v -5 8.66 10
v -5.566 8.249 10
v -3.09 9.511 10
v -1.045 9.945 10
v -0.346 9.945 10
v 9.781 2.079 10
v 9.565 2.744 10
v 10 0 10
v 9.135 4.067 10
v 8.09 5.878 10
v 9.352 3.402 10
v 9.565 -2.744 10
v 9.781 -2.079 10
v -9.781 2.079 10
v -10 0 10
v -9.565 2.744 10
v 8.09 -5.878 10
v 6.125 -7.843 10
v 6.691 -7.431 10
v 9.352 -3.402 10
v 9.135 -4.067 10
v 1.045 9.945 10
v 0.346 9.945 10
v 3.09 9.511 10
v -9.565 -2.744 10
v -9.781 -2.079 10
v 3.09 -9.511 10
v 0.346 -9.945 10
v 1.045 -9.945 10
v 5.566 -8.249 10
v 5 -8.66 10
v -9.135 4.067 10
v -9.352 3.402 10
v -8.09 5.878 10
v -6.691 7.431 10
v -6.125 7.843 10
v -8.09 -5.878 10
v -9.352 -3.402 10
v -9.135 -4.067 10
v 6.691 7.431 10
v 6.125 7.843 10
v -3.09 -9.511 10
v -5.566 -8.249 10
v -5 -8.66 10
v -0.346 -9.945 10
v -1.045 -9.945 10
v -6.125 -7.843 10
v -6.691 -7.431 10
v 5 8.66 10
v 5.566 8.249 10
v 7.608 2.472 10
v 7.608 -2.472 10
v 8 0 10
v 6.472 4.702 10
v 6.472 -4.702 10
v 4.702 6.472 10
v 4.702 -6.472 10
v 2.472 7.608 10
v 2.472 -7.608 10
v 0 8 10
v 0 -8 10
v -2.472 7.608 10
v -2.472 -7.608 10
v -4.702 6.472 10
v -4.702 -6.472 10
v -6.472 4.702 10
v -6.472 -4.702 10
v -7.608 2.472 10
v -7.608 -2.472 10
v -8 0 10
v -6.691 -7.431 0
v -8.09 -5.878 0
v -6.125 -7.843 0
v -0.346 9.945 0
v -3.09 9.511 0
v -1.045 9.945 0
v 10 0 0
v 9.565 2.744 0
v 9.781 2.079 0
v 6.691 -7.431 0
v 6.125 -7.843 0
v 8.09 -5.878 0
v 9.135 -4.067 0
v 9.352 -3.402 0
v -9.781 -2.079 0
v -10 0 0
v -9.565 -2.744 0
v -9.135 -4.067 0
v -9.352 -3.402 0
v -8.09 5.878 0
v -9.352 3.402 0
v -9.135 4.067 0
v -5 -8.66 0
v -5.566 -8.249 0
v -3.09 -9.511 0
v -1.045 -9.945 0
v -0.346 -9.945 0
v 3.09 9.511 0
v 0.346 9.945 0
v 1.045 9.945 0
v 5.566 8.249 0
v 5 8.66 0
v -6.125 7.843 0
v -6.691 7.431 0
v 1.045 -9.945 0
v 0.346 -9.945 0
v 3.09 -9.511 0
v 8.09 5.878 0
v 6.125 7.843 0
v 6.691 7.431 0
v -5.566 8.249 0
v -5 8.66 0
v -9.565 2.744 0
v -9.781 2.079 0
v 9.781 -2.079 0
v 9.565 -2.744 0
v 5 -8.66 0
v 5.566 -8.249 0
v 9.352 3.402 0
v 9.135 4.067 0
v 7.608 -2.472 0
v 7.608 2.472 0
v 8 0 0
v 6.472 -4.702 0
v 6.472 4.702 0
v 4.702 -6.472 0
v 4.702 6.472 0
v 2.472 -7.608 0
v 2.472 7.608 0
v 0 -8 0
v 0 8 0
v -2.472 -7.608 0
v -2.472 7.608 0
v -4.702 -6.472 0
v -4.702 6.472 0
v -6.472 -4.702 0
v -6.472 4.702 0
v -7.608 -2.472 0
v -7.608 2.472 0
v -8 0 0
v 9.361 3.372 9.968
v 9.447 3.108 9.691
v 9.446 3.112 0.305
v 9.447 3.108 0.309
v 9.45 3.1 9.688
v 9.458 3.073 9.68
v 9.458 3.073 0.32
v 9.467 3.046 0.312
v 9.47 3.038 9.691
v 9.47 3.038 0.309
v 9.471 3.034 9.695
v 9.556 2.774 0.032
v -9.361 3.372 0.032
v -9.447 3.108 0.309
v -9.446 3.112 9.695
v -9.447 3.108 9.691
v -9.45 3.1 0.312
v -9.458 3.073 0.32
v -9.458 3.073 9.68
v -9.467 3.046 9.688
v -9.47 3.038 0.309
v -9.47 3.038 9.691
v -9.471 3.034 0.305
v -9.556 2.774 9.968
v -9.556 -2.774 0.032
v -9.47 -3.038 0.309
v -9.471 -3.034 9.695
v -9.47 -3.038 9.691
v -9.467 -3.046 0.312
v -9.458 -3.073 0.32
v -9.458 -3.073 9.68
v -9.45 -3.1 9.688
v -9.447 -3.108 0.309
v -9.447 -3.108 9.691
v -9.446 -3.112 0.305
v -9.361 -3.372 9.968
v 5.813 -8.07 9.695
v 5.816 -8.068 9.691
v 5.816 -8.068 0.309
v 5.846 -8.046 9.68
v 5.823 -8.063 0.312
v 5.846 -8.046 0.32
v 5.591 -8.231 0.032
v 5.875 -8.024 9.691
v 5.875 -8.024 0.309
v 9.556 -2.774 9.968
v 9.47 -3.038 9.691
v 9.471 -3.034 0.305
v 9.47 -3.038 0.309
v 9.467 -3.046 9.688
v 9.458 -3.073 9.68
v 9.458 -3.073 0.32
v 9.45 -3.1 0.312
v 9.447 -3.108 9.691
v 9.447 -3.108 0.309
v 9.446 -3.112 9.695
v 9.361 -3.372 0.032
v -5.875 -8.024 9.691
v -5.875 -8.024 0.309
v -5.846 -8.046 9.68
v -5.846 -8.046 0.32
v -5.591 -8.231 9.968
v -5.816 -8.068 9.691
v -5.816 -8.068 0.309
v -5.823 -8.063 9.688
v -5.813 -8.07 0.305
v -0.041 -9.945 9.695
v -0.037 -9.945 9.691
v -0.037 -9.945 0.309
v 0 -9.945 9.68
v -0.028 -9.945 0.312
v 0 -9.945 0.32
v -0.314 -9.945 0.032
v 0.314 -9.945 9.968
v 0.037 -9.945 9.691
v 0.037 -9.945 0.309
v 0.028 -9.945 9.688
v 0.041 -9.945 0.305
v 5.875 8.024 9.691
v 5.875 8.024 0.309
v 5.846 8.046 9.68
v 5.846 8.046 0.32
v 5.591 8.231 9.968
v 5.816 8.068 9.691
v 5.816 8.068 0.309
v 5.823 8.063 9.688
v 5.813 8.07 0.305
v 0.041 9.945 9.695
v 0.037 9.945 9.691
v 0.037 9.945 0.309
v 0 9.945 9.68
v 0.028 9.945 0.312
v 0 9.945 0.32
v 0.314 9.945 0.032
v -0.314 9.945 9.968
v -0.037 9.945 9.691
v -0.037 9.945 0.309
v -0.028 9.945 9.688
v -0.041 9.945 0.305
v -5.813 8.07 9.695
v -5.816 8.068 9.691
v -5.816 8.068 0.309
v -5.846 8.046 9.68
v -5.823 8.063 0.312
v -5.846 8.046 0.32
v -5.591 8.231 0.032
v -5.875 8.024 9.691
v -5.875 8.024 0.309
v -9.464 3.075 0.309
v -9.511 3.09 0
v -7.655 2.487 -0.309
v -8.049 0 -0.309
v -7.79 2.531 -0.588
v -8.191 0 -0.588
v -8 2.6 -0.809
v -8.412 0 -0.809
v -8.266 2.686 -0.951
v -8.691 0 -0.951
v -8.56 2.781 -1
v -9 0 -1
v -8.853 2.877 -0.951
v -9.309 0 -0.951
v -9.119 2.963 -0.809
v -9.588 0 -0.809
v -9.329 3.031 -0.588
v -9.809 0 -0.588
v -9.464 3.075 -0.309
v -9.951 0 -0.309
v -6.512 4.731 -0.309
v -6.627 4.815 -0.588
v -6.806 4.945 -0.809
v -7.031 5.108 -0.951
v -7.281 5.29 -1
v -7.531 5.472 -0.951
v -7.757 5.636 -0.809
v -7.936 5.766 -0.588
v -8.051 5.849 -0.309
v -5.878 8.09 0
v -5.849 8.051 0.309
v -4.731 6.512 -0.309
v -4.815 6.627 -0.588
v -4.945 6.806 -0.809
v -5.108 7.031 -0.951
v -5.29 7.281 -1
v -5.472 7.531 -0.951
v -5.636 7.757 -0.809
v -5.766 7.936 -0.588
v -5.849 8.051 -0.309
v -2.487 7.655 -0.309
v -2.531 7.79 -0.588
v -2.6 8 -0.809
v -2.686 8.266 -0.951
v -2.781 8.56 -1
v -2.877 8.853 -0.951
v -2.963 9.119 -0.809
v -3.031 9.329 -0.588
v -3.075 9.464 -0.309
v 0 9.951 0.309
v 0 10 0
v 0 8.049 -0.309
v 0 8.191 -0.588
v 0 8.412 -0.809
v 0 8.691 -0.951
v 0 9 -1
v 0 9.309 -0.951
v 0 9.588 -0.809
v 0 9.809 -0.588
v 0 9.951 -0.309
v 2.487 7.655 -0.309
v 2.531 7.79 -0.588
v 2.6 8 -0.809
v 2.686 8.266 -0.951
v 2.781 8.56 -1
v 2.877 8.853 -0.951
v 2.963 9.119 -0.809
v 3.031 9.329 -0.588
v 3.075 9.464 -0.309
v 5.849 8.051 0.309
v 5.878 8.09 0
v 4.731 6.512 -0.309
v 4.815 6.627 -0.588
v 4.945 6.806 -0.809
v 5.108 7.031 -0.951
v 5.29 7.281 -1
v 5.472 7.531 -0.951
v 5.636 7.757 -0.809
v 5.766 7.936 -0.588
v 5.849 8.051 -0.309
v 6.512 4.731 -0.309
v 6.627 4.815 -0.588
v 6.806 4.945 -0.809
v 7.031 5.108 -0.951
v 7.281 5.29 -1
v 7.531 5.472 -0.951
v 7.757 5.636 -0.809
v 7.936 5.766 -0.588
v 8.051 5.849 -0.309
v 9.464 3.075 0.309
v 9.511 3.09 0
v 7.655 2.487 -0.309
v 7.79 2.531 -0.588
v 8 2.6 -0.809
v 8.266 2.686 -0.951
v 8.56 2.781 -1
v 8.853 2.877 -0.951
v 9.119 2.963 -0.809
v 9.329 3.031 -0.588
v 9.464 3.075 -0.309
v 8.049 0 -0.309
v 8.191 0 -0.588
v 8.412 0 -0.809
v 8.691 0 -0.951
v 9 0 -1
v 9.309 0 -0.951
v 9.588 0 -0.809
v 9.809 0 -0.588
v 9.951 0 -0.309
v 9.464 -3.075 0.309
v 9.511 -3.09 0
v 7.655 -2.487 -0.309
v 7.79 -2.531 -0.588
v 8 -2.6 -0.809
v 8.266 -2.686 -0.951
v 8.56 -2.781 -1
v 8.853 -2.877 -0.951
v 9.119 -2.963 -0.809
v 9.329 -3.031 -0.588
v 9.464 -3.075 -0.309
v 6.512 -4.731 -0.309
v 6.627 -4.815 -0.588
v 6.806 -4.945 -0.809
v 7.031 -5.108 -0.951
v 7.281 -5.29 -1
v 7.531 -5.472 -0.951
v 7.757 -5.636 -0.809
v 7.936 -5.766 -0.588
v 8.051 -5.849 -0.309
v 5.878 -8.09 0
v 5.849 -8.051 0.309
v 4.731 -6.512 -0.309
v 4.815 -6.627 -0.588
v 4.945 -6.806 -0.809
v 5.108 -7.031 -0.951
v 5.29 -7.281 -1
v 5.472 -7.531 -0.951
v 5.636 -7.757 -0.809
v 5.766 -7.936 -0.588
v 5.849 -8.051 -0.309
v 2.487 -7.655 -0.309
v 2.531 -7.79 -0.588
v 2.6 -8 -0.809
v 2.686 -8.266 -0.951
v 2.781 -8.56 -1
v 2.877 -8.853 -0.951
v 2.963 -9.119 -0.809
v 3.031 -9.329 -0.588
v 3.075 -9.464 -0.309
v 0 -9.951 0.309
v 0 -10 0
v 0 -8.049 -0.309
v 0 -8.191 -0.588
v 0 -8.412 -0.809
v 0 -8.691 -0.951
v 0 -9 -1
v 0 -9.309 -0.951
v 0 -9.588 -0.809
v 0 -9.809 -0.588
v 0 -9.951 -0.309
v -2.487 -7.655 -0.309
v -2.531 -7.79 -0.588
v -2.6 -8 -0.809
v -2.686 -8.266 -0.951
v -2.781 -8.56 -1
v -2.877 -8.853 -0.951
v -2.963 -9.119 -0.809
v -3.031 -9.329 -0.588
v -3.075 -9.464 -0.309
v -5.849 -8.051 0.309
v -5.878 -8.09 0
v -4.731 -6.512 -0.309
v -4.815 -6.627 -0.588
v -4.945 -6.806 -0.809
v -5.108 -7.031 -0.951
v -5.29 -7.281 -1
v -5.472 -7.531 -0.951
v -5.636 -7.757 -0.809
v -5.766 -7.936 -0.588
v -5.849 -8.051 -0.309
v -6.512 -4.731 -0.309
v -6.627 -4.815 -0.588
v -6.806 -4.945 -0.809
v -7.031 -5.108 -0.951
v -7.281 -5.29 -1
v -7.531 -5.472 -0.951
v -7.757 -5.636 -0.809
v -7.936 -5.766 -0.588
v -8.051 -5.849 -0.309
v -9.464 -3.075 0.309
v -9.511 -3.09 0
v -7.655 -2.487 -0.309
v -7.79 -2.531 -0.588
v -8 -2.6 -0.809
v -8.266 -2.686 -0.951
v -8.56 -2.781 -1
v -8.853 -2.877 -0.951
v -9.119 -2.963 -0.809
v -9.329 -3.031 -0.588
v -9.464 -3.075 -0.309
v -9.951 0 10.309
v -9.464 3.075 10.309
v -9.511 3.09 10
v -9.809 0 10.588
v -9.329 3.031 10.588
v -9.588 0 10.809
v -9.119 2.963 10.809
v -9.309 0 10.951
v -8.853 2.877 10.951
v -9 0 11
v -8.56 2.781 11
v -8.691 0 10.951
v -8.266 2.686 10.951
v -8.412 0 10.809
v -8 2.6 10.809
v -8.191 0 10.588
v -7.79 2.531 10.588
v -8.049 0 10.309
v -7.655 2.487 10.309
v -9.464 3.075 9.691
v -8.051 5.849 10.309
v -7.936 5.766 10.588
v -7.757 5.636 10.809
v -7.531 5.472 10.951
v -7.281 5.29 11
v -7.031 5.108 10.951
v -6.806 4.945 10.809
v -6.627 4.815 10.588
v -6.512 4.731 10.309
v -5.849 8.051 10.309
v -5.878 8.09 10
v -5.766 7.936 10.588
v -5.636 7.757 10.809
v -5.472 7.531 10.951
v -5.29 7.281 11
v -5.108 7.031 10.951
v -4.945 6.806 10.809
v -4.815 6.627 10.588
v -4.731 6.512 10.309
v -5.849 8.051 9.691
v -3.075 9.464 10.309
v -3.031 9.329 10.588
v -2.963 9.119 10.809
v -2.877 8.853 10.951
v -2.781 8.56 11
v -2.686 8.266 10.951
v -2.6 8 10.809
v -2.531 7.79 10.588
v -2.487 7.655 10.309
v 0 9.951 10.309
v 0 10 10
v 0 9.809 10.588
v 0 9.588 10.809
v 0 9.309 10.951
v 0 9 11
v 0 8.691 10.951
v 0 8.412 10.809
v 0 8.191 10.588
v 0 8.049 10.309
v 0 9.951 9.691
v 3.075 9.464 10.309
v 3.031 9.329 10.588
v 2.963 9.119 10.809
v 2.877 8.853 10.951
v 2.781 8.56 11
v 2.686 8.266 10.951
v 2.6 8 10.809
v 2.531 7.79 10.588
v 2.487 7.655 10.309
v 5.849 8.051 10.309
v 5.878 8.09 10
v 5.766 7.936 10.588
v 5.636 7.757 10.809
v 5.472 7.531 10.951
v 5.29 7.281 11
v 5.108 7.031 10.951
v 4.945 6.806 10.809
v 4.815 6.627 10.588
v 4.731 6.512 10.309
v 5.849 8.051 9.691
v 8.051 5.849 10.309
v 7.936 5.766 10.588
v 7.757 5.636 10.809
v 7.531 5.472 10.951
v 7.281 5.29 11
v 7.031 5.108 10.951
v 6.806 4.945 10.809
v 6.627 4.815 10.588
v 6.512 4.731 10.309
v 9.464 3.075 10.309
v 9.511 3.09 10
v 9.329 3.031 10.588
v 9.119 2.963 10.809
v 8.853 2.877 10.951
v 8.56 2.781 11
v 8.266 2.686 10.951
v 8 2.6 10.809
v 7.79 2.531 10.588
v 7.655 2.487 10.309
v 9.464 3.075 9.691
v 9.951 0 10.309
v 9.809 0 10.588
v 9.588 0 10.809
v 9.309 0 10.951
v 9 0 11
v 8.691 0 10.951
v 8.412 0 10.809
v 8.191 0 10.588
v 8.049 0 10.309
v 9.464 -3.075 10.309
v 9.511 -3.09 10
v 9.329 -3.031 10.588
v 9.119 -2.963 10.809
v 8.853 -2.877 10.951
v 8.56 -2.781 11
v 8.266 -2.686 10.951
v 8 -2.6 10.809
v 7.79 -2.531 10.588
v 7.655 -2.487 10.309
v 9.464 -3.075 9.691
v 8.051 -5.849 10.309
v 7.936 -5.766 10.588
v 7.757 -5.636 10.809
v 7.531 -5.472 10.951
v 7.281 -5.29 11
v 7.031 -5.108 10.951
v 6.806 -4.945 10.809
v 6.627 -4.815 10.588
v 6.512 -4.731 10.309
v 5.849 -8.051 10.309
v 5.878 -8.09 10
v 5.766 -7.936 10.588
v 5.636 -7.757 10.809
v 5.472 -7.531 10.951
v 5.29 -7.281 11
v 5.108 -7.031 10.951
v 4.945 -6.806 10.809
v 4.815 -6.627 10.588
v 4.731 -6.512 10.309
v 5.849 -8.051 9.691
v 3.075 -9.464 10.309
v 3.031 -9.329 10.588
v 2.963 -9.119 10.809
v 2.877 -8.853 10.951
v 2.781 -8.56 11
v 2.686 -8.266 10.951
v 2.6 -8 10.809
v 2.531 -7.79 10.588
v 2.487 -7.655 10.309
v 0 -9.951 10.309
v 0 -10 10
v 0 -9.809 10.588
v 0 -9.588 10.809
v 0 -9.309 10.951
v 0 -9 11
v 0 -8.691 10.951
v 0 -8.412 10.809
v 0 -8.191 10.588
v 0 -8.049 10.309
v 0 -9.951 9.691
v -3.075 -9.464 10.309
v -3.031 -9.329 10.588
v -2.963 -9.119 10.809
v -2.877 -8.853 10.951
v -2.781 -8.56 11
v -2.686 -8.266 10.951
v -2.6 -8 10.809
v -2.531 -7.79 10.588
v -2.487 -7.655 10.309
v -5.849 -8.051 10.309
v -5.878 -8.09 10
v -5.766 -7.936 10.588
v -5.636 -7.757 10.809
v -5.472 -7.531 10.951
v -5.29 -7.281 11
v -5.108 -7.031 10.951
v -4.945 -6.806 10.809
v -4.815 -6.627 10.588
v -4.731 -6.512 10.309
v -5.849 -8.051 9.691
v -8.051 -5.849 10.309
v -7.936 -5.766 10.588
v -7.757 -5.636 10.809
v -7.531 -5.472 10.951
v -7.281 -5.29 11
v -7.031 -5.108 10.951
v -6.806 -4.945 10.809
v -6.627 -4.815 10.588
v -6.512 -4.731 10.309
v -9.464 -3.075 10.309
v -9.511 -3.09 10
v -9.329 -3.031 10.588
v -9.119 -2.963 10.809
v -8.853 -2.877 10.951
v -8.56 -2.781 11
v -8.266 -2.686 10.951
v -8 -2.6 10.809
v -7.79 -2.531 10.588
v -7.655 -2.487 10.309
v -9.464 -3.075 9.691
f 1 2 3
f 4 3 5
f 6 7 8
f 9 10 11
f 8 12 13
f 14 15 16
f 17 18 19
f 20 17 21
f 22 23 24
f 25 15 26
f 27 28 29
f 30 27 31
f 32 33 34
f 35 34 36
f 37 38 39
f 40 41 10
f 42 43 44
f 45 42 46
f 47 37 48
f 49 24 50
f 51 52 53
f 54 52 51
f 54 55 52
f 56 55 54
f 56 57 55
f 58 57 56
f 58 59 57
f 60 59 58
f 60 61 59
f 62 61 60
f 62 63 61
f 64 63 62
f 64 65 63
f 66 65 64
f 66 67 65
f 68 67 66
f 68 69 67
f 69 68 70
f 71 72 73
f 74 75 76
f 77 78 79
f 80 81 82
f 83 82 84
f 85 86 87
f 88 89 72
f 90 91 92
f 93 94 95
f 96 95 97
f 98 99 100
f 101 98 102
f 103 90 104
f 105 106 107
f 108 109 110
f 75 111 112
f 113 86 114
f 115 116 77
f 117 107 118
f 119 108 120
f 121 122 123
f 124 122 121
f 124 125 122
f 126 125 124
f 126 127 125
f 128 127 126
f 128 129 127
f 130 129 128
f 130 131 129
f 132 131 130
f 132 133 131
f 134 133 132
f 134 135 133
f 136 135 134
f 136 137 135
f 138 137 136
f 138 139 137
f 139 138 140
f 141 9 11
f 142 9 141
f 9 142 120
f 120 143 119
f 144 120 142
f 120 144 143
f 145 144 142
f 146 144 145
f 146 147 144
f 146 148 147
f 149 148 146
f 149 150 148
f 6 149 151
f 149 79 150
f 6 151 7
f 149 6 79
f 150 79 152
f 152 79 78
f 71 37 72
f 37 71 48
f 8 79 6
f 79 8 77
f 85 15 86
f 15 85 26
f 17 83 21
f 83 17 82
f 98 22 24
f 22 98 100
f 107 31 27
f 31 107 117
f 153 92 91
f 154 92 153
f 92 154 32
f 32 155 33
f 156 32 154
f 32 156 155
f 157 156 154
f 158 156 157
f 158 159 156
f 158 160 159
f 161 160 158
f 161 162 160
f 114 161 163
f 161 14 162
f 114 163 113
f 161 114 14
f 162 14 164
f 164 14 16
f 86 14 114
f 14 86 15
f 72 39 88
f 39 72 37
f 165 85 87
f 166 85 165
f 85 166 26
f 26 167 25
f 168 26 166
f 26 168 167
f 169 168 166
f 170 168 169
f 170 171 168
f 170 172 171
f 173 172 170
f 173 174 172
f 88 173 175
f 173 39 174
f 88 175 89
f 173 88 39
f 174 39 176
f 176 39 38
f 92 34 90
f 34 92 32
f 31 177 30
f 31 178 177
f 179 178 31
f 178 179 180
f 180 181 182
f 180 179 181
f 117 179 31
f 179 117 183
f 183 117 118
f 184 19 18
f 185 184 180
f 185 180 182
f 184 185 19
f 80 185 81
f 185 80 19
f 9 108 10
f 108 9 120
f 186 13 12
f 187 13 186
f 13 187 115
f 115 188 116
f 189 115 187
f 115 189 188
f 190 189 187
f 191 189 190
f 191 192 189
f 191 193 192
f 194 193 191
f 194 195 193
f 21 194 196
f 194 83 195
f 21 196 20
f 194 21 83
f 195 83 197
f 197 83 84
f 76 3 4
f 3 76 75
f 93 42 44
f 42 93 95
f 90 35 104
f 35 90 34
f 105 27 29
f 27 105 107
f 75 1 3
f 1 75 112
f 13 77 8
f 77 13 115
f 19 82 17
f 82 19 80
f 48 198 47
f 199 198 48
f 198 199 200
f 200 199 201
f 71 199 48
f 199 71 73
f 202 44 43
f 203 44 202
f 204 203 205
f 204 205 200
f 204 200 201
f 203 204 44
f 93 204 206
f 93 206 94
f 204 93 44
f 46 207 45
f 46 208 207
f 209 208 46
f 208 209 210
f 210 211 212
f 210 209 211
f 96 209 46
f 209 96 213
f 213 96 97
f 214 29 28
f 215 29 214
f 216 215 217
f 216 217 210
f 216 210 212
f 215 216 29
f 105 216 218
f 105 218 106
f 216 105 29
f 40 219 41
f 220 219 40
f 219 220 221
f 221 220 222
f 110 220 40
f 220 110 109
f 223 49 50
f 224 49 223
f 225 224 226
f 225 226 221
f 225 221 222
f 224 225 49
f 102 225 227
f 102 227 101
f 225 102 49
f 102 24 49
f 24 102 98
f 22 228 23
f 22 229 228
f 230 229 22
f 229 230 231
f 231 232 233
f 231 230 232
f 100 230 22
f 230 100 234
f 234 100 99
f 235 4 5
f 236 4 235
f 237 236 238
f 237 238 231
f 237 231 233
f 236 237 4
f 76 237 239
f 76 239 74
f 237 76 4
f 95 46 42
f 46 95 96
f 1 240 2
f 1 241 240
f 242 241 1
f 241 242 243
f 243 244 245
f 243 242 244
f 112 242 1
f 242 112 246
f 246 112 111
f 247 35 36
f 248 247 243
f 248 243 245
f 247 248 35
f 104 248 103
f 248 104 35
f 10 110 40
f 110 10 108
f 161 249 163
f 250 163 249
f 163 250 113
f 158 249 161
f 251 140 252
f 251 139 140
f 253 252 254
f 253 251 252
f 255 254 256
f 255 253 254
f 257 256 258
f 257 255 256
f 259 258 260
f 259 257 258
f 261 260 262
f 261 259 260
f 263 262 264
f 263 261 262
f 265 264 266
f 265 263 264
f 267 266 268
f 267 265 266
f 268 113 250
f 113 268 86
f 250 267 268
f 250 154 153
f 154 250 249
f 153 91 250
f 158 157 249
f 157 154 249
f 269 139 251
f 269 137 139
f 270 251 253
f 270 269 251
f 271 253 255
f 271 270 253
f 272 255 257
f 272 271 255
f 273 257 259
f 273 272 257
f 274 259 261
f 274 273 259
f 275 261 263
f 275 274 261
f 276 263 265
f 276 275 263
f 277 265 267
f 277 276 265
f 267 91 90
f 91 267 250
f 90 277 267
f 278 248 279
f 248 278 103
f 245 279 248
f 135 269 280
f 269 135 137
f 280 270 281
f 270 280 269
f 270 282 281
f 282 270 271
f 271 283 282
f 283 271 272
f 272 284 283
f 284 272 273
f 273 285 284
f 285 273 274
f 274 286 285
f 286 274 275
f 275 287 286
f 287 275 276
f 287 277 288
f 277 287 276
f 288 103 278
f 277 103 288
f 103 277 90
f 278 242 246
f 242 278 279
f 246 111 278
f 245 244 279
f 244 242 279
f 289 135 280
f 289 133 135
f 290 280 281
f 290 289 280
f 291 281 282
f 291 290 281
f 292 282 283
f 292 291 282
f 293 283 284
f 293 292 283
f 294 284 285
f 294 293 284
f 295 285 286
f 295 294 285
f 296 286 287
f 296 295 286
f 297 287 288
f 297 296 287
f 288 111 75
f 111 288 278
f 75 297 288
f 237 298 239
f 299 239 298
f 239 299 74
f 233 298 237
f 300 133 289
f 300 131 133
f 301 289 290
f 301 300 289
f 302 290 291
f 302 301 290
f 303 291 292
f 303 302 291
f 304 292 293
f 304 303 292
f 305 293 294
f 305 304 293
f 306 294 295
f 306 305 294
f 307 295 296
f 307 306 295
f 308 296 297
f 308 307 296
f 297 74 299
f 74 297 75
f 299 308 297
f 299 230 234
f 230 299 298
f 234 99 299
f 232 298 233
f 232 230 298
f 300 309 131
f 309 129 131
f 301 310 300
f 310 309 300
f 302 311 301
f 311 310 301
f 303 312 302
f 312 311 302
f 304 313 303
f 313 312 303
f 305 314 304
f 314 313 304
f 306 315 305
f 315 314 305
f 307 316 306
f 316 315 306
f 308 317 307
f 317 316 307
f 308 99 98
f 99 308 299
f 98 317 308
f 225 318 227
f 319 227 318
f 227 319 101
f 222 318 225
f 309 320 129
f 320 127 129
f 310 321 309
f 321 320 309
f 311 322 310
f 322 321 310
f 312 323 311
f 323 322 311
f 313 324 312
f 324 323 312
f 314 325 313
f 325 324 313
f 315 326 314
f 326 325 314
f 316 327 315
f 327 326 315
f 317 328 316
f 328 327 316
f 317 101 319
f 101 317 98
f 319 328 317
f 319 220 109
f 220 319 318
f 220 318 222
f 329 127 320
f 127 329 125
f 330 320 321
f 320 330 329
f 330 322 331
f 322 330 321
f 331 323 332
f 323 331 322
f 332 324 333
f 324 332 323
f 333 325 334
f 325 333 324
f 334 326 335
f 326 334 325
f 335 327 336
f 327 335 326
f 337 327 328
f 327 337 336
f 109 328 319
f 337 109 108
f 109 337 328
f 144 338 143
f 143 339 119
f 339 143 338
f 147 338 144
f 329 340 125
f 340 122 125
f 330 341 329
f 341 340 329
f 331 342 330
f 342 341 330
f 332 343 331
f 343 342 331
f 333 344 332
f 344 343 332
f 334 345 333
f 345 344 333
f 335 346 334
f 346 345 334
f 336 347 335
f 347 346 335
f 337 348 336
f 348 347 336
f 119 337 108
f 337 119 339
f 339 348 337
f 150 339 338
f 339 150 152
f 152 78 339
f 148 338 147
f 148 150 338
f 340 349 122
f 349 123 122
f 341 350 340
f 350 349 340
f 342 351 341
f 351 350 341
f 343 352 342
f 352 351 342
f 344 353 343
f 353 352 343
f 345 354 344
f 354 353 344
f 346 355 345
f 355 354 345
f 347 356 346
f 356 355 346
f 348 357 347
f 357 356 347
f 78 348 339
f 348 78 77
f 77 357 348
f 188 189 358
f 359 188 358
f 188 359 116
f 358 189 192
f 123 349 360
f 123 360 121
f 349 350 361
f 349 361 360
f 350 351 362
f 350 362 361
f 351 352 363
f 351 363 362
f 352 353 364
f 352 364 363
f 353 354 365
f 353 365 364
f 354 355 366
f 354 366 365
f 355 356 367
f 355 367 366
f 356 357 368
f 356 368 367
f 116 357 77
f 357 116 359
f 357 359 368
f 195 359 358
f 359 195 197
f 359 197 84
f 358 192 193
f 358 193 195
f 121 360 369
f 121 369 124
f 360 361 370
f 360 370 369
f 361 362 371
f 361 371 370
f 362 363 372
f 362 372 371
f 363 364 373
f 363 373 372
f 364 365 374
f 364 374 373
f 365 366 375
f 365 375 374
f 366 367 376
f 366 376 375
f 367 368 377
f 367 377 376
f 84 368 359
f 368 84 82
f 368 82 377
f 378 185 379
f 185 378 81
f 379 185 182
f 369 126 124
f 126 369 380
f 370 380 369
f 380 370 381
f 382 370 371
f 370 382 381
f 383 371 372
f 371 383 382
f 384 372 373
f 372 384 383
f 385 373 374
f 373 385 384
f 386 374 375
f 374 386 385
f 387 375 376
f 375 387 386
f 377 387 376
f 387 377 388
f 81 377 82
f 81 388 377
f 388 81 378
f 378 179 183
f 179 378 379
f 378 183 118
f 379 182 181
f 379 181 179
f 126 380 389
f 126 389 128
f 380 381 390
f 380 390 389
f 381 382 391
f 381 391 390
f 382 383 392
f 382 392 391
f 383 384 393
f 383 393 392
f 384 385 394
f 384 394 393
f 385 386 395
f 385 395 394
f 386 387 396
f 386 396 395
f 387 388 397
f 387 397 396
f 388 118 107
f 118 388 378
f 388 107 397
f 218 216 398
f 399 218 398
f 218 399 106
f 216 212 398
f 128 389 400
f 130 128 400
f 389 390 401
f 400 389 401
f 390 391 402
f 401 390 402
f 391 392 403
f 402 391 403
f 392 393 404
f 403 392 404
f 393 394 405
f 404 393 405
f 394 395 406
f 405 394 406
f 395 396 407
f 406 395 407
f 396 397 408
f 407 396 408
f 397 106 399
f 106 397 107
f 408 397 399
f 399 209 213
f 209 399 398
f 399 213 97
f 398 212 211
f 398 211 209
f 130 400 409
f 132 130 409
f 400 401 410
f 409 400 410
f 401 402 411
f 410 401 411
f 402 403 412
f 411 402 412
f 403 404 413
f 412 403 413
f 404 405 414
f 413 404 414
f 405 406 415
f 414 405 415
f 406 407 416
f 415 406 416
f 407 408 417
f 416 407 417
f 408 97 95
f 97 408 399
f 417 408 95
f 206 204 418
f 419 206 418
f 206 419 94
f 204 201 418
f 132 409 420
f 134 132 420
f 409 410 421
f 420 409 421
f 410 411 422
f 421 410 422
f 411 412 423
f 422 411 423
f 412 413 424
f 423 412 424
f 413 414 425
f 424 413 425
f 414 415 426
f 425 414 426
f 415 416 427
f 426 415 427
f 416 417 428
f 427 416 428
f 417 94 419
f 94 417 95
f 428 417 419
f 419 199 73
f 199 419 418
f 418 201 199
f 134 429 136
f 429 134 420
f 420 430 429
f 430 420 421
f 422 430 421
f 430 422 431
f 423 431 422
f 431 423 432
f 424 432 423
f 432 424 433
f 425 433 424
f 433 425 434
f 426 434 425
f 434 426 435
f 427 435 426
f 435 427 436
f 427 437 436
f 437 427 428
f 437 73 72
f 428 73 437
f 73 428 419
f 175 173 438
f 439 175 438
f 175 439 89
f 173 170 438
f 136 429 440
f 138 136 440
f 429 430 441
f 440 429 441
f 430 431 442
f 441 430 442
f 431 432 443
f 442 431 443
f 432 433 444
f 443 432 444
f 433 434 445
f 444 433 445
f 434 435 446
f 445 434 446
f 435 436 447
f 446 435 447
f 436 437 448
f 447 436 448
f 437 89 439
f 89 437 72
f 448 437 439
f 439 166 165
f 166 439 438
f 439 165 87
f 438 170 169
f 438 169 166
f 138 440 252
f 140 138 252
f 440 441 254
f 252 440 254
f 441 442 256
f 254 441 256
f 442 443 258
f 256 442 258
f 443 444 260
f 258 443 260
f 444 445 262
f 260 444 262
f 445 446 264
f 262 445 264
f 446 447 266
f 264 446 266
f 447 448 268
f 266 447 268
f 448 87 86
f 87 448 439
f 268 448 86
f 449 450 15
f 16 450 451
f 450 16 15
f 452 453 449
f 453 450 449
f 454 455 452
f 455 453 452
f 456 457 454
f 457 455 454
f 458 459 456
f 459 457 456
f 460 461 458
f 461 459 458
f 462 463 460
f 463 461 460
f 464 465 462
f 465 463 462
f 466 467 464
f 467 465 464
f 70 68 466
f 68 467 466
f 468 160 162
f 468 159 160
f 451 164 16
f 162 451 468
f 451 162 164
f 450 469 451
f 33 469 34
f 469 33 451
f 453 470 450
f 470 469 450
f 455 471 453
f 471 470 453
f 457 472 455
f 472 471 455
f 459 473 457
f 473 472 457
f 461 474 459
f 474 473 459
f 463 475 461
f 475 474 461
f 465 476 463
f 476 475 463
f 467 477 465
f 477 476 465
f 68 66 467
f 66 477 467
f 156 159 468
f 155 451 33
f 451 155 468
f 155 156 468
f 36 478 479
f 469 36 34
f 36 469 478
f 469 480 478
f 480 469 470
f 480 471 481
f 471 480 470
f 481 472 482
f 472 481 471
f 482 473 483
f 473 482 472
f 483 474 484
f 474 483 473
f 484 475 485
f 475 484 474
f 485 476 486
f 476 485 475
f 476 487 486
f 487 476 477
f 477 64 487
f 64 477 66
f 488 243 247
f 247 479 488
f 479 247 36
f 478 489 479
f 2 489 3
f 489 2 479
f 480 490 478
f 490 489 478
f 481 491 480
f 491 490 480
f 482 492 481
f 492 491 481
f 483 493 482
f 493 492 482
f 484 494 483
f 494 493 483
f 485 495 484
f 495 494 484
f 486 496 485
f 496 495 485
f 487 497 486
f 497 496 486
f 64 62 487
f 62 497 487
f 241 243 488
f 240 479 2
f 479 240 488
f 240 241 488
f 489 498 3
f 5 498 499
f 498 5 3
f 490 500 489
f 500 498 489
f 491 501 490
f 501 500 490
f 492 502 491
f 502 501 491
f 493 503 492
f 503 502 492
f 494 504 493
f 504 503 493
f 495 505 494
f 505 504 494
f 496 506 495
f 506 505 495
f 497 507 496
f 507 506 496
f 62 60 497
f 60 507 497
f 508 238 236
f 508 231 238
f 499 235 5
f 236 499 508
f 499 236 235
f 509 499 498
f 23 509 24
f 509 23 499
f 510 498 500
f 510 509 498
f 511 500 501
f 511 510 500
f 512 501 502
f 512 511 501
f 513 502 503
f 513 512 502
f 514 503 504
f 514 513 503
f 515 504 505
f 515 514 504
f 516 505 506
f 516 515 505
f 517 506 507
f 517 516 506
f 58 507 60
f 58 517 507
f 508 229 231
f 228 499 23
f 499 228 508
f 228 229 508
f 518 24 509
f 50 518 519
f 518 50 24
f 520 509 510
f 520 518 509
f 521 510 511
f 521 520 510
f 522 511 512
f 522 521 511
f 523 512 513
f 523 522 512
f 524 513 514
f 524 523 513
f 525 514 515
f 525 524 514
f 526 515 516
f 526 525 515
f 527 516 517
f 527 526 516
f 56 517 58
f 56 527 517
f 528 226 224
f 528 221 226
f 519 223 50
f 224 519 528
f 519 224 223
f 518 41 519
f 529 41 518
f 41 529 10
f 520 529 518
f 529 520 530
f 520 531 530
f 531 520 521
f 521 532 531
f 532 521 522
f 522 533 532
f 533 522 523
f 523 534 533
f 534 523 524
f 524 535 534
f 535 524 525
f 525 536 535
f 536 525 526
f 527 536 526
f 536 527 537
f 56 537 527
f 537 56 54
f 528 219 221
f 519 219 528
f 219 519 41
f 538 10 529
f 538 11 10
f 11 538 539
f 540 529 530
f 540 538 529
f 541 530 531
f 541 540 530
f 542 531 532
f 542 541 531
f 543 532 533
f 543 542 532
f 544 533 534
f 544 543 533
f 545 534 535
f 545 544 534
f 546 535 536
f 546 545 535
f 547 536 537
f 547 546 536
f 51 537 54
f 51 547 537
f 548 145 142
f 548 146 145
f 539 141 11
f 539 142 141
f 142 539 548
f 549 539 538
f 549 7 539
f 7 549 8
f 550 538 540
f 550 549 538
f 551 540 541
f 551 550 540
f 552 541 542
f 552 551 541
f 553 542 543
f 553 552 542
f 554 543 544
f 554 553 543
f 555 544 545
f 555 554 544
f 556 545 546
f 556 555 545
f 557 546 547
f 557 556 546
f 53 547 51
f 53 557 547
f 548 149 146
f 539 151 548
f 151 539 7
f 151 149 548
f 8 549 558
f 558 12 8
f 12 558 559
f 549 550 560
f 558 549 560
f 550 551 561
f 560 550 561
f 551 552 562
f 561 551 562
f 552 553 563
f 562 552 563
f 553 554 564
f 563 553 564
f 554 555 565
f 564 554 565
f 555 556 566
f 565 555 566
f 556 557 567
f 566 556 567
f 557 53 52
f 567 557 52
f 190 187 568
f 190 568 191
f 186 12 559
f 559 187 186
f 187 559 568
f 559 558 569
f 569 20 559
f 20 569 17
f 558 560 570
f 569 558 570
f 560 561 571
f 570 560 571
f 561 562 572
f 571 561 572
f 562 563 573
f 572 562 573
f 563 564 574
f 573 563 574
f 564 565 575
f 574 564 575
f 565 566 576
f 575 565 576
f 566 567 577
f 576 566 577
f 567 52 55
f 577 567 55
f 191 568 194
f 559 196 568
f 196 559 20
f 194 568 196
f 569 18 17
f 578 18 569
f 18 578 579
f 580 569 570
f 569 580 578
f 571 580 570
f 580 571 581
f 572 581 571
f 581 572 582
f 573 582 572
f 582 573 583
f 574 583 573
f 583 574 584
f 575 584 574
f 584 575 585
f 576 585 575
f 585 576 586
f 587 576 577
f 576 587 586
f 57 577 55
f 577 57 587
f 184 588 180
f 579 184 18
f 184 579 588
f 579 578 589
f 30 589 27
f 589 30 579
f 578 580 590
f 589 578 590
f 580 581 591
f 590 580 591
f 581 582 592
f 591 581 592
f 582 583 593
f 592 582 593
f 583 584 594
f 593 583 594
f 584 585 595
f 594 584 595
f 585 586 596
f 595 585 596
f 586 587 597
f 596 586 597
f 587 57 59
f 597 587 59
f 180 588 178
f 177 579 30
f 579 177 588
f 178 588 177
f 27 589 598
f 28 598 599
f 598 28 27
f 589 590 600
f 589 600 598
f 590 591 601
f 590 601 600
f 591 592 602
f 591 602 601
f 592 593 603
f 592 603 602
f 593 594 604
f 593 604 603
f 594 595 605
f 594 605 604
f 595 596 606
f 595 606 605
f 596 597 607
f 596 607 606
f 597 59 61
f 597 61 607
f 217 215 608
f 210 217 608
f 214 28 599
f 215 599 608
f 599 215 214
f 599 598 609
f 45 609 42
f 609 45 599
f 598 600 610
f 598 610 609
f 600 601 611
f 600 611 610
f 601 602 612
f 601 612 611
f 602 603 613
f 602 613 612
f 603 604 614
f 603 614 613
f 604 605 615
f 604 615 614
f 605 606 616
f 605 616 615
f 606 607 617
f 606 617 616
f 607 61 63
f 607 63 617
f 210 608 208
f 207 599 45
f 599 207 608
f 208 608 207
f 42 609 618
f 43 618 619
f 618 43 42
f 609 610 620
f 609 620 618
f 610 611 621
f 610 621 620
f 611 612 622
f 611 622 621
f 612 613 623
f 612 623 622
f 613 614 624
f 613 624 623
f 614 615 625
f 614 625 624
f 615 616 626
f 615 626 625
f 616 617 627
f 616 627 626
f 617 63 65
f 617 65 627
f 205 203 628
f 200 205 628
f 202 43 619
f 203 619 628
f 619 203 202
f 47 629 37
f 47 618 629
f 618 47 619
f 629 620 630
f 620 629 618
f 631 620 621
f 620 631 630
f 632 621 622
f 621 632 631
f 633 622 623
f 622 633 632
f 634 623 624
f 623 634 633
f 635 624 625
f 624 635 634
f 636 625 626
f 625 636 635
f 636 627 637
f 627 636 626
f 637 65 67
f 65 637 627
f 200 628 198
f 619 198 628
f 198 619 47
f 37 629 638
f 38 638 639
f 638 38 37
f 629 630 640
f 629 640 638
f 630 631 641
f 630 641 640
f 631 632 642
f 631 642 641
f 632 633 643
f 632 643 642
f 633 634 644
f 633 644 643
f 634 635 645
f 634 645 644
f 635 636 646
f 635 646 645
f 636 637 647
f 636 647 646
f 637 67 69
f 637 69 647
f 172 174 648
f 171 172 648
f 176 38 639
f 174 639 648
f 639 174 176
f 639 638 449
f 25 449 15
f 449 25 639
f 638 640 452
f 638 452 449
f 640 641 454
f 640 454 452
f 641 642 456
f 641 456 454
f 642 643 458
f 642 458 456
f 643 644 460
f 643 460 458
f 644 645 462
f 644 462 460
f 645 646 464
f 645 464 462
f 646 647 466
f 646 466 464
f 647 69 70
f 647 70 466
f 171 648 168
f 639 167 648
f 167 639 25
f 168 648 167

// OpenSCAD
FACETS=20;
RADIUS=10;
HAT_SIZE=8;


module drawRoundedCylinder(radius,height,cornerRadius=1,top=true,bottom=true)
{
	// Fill bottom rounded edge
	linear_extrude(cornerRadius*2, true, 10)
	circle(radius-cornerRadius/4);

	// Draw main cylinder
	translate([0,0,0])
	linear_extrude(height-cornerRadius*2, true, 10)
	circle(radius);

	// Draw bottom rounded edge
	rotate_extrude(convexity = 10, $fn=FACETS)
	translate([radius-cornerRadius, 0, 0])
	circle(r = cornerRadius, $fn=FACETS);

	// Draw top rounded edge
	translate([0,0,height+5.25-cornerRadius/4])
	rotate_extrude(convexity = 10, $fn=FACETS)
	translate([radius-cornerRadius, 0, 0])
	circle(r = cornerRadius, $fn=FACETS);
}

module drawHat()
{
	translate([0,0,30])
	cube([HAT_SIZE,HAT_SIZE,HAT_SIZE], center=true);
}

module drawBody()
{
	sphere(RADIUS,$fn=FACETS);

	translate([0,0,RADIUS*1.2])
	sphere(RADIUS*0.8, $fn=FACETS);

	translate([0,0,RADIUS*2.2])
	sphere(RADIUS*0.6,$fn=FACETS);
}

drawRoundedCylinder(10,5,1,true,true);

//drawBody();
//drawHat();
